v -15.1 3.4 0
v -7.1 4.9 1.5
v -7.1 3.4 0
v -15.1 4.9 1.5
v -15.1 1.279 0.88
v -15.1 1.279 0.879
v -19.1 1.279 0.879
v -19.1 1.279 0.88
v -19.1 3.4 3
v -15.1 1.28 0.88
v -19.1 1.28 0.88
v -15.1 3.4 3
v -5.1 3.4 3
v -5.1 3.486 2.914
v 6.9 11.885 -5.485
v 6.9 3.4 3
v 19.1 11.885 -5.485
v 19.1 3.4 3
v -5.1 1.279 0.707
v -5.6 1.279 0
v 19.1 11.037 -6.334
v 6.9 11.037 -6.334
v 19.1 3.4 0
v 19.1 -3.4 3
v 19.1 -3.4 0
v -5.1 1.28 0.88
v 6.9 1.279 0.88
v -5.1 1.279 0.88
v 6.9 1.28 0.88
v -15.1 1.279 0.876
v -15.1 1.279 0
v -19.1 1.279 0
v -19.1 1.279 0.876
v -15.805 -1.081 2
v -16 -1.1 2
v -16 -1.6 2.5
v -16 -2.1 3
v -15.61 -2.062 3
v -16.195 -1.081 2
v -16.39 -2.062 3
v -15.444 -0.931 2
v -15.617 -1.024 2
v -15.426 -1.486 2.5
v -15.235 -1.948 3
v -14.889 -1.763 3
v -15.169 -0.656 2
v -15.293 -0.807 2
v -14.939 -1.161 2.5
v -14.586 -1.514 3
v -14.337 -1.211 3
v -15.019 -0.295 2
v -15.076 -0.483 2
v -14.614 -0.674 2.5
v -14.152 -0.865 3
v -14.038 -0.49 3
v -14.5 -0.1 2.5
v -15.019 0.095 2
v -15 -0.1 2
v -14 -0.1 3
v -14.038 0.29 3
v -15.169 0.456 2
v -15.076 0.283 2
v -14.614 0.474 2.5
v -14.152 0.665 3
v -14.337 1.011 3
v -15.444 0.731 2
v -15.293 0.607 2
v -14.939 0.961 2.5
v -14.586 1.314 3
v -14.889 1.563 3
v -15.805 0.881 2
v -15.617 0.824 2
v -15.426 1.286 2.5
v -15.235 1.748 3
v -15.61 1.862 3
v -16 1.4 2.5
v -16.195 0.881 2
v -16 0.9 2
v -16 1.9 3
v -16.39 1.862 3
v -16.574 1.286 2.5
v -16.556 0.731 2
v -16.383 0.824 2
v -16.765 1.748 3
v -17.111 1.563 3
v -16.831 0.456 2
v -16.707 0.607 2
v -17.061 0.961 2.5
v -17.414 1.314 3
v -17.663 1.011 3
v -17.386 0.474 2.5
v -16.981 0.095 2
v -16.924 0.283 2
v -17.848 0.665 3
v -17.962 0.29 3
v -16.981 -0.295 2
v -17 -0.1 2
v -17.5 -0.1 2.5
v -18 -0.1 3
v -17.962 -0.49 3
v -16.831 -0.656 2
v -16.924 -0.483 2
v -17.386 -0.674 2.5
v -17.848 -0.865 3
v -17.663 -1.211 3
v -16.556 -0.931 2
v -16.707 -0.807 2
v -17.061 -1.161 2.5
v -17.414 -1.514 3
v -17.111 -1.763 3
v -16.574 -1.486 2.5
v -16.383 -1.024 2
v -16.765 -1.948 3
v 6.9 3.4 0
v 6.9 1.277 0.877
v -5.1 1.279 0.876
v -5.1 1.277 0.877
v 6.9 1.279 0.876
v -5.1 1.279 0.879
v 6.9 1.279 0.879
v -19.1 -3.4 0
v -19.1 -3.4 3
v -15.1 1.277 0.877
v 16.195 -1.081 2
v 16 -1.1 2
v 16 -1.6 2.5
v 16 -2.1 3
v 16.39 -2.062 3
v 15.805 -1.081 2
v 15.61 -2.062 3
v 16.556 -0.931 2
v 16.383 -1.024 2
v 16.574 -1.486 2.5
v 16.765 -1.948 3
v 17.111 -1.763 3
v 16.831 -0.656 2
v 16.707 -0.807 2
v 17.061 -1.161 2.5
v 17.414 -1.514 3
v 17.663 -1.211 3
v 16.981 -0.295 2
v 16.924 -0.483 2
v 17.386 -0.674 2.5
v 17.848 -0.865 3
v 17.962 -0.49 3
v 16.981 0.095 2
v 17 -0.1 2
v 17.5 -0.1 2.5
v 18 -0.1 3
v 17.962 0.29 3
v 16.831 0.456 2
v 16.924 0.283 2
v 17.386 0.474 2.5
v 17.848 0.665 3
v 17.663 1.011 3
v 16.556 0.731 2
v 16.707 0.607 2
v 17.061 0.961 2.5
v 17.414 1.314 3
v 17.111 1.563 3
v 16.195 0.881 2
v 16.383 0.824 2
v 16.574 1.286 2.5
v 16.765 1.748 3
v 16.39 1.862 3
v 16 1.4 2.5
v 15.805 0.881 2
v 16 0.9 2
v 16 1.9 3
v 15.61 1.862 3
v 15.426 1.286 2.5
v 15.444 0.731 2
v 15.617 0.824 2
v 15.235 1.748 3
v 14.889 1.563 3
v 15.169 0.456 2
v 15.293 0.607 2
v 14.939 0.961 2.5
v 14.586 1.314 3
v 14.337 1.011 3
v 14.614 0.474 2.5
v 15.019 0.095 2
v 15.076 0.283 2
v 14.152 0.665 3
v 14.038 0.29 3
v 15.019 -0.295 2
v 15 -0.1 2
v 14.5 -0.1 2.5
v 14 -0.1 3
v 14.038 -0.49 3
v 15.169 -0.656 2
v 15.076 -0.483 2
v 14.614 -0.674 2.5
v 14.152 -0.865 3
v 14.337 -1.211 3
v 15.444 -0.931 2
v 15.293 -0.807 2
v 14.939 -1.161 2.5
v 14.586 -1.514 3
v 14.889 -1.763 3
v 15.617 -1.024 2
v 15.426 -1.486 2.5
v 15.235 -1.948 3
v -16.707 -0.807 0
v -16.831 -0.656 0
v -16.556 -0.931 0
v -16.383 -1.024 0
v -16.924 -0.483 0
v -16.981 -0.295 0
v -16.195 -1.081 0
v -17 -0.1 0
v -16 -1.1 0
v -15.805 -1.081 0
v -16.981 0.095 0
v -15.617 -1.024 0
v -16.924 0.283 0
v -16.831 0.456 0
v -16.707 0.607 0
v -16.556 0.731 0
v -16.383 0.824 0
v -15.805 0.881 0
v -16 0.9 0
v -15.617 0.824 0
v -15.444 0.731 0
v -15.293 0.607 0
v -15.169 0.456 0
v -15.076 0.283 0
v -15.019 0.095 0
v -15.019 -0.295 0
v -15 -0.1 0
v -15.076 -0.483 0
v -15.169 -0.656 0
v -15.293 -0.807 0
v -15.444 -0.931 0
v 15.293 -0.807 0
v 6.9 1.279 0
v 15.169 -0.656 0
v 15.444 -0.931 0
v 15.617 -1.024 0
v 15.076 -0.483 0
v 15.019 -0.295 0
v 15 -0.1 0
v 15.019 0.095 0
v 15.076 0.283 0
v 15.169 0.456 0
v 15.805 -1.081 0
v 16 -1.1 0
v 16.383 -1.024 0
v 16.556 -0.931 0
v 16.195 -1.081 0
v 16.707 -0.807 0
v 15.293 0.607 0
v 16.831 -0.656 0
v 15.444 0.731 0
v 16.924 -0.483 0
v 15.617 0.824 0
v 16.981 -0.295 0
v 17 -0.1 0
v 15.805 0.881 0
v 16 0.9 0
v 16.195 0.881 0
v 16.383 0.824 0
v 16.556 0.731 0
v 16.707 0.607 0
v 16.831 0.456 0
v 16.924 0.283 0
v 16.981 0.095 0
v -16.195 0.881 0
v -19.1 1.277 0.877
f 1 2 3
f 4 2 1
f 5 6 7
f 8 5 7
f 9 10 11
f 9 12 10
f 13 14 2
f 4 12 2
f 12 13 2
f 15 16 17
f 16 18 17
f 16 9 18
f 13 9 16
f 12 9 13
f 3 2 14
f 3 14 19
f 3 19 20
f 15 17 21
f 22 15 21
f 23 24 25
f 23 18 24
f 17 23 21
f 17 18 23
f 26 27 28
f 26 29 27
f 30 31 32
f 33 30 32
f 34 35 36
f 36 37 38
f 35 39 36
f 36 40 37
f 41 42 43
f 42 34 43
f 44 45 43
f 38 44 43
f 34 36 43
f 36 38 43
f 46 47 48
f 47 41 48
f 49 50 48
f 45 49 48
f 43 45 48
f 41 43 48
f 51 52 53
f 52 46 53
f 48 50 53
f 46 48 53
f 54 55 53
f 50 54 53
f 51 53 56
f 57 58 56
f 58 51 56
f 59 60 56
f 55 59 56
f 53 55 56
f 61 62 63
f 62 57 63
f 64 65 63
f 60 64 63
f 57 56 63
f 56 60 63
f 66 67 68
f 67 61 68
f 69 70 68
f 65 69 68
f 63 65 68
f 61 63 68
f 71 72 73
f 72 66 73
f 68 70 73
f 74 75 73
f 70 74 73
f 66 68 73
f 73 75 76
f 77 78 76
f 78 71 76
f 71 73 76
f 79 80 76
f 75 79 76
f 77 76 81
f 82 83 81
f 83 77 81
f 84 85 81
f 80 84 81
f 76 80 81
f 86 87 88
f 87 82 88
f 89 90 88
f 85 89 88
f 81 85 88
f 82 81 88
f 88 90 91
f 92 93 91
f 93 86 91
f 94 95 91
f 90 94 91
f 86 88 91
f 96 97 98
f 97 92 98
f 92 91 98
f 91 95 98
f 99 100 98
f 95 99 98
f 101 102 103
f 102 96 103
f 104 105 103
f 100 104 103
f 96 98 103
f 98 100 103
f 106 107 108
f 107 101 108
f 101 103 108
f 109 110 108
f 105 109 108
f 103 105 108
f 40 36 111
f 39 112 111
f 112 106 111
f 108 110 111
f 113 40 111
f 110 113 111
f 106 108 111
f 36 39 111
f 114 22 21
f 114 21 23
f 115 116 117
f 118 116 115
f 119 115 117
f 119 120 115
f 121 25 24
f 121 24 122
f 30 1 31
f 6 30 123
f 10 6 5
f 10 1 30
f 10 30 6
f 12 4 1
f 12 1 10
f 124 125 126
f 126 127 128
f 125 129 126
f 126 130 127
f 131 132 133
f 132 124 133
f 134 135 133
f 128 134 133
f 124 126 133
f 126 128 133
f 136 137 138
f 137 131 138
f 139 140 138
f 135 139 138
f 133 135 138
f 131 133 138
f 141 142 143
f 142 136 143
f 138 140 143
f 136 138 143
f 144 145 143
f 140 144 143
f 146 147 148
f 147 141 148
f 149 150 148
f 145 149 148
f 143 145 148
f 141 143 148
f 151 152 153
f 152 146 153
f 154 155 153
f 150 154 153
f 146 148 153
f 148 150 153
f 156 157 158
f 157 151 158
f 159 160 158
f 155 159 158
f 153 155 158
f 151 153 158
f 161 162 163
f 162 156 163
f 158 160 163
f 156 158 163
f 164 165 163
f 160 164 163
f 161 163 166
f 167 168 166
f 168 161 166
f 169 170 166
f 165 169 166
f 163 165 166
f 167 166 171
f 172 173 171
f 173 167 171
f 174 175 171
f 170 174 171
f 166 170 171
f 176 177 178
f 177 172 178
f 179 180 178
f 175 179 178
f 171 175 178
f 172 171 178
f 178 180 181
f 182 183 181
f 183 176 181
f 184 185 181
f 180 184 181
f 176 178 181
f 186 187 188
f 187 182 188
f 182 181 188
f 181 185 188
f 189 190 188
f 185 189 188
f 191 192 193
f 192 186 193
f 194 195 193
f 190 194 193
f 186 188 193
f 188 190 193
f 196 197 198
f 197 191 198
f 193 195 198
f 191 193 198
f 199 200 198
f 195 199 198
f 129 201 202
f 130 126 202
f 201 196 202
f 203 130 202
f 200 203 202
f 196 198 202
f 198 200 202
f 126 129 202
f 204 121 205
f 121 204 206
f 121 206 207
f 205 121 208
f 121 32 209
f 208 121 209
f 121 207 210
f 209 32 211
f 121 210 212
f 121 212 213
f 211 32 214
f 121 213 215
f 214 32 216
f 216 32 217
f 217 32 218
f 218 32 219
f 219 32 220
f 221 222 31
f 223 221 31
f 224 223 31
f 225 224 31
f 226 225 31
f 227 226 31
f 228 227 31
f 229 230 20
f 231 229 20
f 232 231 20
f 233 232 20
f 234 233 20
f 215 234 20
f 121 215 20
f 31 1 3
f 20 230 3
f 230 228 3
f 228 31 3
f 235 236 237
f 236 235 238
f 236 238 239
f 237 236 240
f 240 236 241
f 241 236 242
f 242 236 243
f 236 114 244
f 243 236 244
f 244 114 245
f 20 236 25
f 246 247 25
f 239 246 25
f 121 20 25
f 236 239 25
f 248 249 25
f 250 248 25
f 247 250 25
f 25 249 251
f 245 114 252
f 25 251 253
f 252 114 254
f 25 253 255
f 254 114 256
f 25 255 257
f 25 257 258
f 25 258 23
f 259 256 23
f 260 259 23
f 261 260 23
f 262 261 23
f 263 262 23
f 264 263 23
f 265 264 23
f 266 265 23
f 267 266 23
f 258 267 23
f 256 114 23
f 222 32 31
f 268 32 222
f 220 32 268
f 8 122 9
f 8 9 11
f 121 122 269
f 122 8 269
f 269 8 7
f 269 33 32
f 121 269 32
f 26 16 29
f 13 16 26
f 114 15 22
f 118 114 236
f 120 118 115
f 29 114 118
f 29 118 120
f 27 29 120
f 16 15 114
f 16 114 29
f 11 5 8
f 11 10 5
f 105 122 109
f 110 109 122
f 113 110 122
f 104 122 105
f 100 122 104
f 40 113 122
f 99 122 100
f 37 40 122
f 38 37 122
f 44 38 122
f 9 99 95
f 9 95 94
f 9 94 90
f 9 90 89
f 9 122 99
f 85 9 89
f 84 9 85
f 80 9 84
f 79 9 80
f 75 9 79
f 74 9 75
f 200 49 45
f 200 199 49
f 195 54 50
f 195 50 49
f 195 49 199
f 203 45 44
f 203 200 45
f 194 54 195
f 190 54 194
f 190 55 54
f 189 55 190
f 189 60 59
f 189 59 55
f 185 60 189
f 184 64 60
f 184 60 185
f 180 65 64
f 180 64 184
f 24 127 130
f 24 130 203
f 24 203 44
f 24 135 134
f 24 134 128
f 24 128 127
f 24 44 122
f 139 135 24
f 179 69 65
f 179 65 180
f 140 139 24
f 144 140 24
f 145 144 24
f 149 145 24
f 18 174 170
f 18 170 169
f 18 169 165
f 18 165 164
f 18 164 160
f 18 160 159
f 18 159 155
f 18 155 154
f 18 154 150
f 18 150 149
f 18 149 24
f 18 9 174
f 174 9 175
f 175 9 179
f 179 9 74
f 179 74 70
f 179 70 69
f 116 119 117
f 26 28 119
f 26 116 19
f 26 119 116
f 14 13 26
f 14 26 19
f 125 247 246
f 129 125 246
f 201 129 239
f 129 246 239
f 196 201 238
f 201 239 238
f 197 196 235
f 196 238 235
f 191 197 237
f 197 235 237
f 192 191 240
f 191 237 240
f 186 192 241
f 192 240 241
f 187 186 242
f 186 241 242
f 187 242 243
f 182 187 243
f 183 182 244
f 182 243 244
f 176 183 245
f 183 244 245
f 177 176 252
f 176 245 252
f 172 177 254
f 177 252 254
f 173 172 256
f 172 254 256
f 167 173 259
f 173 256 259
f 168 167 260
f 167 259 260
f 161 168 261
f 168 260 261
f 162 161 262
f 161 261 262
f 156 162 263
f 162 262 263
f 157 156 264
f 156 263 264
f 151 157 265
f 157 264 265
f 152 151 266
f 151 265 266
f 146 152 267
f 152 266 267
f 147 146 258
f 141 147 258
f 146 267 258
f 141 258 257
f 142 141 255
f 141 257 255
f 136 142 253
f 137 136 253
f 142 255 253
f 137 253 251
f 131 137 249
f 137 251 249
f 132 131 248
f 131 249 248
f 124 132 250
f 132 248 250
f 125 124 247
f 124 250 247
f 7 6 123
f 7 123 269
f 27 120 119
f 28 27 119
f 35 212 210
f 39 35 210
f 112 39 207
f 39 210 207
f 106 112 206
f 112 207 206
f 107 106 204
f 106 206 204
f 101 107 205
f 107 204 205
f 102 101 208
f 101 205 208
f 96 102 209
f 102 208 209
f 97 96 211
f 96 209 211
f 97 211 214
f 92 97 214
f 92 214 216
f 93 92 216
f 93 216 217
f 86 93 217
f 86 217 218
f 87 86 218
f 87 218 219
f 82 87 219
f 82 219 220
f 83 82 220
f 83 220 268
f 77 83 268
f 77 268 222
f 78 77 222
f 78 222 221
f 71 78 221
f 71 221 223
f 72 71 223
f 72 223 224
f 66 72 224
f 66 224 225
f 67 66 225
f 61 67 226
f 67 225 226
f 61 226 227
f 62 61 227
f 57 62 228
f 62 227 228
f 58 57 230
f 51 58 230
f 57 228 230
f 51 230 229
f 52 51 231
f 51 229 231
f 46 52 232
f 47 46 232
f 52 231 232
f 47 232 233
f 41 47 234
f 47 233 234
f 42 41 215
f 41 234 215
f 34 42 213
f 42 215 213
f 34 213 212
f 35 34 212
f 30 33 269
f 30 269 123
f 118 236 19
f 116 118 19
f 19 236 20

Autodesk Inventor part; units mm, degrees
ref_plane "YZ Plane" through (0, 0, 0) normal (1, 0, 0) x (0, 1, 0)
ref_plane "XZ Plane" through (0, 0, 0) normal (0, 1, 0) x (-1, 0, 0)
ref_plane "XY Plane" through (0, 0, 0) normal (0, 0, 1) x (1, 0, 0)
sketch "Sketch1" plane through (0, 0, 0) normal (0, 0, 1) x (1, 0, 0)
  line L0 (-19.1, 3.4) -> (19.1, 3.4)
  line L1 (19.1, 3.4) -> (19.1, -3.4)
  line L2 (19.1, -3.4) -> (-19.1, -3.4)
  line L3 (-19.1, -3.4) -> (-19.1, 3.4)
  point P0 (0, 0)
  dimension "d0" = 38.2
  dimension "d1" = 6.8
  dimension "d2" = 19.1
  dimension "d3" = 3.4
extrude "Extrusion1" add sketch "Sketch1" along normal blind 3
sketch "Sketch2" plane through (0, 0, 3) normal (0, 0, 1) x (1, 0, 0)
  line L0 (19.1, 3.4) -> (-19.1, 3.4) projected
  line L1 (-19.1, 3.4) -> (-19.1, -3.4) projected
  line L2 (19.1, -3.4) -> (19.1, 3.4) projected
  point P0 (0, 0)
  point P1 (-16, -0.1)
  point P2 (16, -0.1)
  point P3 (-16, -0.1)
  dimension "d6" = 3.5
  dimension "d7" = 3.5
  dimension "d8" = 32
  dimension "d9" = 3.1
  dimension "d10" = 3.1
hole "Hole1" at (-16, -0.1, 3) at (16, -0.1, 3) direction (0, 0, -1) diameter 2 depth 4 tip angle 118 countersink diameter 4 countersink angle 90
sketch "Sketch3" plane through (19.1, -3.4, 0) normal (1, 0, 0) x (0, 0, -1)
  line L0 (-3, 6.8) -> (-3, 0) projected
  line L1 (-3, 6.8) -> (5.4853, 15.2853)
  line L2 (-3, 6.8) -> (9, 6.8) construction
  line L3 (5.4853, 15.2853) -> (6.3338, 14.4368)
  line L4 (0, 0) -> (0, 6.8) projected
  line L5 (6.3338, 14.4368) -> (0, 6.8)
  line L6 (0, 6.8) -> (-3, 6.8)
  point P0 (0, 3.4)
  dimension "d18" = 12
  dimension "d19" = 45
  dimension "d20" = 1.2
extrude "Extrusion2" add sketch "Sketch3" against normal blind 38.2
sketch "Sketch4" plane through (-19.1, 11.8853, -5.4853) normal (0, 0.7071, 0.7071) x (1, 0, 0)
  line L0 (0, -12) -> (0, 0) projected
  line L1 (38.2, -12) -> (0, -12) projected
  line L2 (0, 0) -> (4, 0)
  line L3 (4, 0) -> (4, -12)
  line L4 (4, -12) -> (0, -12)
  line L5 (0, -12) -> (0, 0)
  line L6 (38.2, 0) -> (0, 0) projected
  line L7 (38.2, -9.8787) -> (0, -9.8787) projected
  line L8 (4, 0) -> (14, 0)
  line L9 (14, 0) -> (14, -9.8787)
  line L10 (14, -9.8787) -> (4, -9.8787)
  line L11 (4, -9.8787) -> (4, 0)
  line L12 (14, 0) -> (26, 0)
  line L13 (26, 0) -> (26, -12)
  line L14 (26, -12) -> (14, -12)
  line L15 (14, -12) -> (14, 0)
  point P0 (19.1, -12.2828)
  point P1 (4, -9.8787)
  point P2 (14, -9.8787)
  dimension "d23" = 4
  dimension "d24" = 4
  dimension "d25" = 14
  dimension "d26" = 26
extrude "Extrusion3" cut sketch "Sketch4" against normal blind 3 contours L0 L7 L3 L1 | L0 L2 L3 L7 | L3 L6 L9 L7 | L15 L7 L13 L1 | L9 L6 L13 L7
sketch "Sketch5" plane through (0, 0, 0) normal (0, 0, -1) x (-1, 0, 0)
  line L0 (5.1, 2.1574) -> (-6.9, 2.1574) projected
  line L1 (-6.9, 1.2787) -> (5.1, 1.2787) projected
  line L2 (-6.9, 2.1574) -> (5.1, 2.1574)
  line L3 (5.1, 2.1574) -> (5.1, 1.2787)
  line L4 (5.1, 1.2787) -> (-6.9, 1.2787)
  line L5 (-6.9, 1.2787) -> (-6.9, 2.1574)
  line L6 (15.1, 2.1574) -> (15.1, 1.2787) projected
  line L7 (15.1, 1.2787) -> (19.1, 1.2787) projected
  line L8 (15.1, 2.1574) -> (19.1, 2.1574)
  line L9 (19.1, 2.1574) -> (19.1, 1.2787)
  line L10 (19.1, 1.2787) -> (15.1, 1.2787)
  line L11 (15.1, 1.2787) -> (15.1, 2.1574)
  point P0 (0, 0)
extrude "Extrusion4" cut sketch "Sketch5" against normal blind 0.88
chamfer "Chamfer1" distance 2 angle 45 1 edges at (-5.1, 4.15, 0.75)
properties part number "display_mount"
